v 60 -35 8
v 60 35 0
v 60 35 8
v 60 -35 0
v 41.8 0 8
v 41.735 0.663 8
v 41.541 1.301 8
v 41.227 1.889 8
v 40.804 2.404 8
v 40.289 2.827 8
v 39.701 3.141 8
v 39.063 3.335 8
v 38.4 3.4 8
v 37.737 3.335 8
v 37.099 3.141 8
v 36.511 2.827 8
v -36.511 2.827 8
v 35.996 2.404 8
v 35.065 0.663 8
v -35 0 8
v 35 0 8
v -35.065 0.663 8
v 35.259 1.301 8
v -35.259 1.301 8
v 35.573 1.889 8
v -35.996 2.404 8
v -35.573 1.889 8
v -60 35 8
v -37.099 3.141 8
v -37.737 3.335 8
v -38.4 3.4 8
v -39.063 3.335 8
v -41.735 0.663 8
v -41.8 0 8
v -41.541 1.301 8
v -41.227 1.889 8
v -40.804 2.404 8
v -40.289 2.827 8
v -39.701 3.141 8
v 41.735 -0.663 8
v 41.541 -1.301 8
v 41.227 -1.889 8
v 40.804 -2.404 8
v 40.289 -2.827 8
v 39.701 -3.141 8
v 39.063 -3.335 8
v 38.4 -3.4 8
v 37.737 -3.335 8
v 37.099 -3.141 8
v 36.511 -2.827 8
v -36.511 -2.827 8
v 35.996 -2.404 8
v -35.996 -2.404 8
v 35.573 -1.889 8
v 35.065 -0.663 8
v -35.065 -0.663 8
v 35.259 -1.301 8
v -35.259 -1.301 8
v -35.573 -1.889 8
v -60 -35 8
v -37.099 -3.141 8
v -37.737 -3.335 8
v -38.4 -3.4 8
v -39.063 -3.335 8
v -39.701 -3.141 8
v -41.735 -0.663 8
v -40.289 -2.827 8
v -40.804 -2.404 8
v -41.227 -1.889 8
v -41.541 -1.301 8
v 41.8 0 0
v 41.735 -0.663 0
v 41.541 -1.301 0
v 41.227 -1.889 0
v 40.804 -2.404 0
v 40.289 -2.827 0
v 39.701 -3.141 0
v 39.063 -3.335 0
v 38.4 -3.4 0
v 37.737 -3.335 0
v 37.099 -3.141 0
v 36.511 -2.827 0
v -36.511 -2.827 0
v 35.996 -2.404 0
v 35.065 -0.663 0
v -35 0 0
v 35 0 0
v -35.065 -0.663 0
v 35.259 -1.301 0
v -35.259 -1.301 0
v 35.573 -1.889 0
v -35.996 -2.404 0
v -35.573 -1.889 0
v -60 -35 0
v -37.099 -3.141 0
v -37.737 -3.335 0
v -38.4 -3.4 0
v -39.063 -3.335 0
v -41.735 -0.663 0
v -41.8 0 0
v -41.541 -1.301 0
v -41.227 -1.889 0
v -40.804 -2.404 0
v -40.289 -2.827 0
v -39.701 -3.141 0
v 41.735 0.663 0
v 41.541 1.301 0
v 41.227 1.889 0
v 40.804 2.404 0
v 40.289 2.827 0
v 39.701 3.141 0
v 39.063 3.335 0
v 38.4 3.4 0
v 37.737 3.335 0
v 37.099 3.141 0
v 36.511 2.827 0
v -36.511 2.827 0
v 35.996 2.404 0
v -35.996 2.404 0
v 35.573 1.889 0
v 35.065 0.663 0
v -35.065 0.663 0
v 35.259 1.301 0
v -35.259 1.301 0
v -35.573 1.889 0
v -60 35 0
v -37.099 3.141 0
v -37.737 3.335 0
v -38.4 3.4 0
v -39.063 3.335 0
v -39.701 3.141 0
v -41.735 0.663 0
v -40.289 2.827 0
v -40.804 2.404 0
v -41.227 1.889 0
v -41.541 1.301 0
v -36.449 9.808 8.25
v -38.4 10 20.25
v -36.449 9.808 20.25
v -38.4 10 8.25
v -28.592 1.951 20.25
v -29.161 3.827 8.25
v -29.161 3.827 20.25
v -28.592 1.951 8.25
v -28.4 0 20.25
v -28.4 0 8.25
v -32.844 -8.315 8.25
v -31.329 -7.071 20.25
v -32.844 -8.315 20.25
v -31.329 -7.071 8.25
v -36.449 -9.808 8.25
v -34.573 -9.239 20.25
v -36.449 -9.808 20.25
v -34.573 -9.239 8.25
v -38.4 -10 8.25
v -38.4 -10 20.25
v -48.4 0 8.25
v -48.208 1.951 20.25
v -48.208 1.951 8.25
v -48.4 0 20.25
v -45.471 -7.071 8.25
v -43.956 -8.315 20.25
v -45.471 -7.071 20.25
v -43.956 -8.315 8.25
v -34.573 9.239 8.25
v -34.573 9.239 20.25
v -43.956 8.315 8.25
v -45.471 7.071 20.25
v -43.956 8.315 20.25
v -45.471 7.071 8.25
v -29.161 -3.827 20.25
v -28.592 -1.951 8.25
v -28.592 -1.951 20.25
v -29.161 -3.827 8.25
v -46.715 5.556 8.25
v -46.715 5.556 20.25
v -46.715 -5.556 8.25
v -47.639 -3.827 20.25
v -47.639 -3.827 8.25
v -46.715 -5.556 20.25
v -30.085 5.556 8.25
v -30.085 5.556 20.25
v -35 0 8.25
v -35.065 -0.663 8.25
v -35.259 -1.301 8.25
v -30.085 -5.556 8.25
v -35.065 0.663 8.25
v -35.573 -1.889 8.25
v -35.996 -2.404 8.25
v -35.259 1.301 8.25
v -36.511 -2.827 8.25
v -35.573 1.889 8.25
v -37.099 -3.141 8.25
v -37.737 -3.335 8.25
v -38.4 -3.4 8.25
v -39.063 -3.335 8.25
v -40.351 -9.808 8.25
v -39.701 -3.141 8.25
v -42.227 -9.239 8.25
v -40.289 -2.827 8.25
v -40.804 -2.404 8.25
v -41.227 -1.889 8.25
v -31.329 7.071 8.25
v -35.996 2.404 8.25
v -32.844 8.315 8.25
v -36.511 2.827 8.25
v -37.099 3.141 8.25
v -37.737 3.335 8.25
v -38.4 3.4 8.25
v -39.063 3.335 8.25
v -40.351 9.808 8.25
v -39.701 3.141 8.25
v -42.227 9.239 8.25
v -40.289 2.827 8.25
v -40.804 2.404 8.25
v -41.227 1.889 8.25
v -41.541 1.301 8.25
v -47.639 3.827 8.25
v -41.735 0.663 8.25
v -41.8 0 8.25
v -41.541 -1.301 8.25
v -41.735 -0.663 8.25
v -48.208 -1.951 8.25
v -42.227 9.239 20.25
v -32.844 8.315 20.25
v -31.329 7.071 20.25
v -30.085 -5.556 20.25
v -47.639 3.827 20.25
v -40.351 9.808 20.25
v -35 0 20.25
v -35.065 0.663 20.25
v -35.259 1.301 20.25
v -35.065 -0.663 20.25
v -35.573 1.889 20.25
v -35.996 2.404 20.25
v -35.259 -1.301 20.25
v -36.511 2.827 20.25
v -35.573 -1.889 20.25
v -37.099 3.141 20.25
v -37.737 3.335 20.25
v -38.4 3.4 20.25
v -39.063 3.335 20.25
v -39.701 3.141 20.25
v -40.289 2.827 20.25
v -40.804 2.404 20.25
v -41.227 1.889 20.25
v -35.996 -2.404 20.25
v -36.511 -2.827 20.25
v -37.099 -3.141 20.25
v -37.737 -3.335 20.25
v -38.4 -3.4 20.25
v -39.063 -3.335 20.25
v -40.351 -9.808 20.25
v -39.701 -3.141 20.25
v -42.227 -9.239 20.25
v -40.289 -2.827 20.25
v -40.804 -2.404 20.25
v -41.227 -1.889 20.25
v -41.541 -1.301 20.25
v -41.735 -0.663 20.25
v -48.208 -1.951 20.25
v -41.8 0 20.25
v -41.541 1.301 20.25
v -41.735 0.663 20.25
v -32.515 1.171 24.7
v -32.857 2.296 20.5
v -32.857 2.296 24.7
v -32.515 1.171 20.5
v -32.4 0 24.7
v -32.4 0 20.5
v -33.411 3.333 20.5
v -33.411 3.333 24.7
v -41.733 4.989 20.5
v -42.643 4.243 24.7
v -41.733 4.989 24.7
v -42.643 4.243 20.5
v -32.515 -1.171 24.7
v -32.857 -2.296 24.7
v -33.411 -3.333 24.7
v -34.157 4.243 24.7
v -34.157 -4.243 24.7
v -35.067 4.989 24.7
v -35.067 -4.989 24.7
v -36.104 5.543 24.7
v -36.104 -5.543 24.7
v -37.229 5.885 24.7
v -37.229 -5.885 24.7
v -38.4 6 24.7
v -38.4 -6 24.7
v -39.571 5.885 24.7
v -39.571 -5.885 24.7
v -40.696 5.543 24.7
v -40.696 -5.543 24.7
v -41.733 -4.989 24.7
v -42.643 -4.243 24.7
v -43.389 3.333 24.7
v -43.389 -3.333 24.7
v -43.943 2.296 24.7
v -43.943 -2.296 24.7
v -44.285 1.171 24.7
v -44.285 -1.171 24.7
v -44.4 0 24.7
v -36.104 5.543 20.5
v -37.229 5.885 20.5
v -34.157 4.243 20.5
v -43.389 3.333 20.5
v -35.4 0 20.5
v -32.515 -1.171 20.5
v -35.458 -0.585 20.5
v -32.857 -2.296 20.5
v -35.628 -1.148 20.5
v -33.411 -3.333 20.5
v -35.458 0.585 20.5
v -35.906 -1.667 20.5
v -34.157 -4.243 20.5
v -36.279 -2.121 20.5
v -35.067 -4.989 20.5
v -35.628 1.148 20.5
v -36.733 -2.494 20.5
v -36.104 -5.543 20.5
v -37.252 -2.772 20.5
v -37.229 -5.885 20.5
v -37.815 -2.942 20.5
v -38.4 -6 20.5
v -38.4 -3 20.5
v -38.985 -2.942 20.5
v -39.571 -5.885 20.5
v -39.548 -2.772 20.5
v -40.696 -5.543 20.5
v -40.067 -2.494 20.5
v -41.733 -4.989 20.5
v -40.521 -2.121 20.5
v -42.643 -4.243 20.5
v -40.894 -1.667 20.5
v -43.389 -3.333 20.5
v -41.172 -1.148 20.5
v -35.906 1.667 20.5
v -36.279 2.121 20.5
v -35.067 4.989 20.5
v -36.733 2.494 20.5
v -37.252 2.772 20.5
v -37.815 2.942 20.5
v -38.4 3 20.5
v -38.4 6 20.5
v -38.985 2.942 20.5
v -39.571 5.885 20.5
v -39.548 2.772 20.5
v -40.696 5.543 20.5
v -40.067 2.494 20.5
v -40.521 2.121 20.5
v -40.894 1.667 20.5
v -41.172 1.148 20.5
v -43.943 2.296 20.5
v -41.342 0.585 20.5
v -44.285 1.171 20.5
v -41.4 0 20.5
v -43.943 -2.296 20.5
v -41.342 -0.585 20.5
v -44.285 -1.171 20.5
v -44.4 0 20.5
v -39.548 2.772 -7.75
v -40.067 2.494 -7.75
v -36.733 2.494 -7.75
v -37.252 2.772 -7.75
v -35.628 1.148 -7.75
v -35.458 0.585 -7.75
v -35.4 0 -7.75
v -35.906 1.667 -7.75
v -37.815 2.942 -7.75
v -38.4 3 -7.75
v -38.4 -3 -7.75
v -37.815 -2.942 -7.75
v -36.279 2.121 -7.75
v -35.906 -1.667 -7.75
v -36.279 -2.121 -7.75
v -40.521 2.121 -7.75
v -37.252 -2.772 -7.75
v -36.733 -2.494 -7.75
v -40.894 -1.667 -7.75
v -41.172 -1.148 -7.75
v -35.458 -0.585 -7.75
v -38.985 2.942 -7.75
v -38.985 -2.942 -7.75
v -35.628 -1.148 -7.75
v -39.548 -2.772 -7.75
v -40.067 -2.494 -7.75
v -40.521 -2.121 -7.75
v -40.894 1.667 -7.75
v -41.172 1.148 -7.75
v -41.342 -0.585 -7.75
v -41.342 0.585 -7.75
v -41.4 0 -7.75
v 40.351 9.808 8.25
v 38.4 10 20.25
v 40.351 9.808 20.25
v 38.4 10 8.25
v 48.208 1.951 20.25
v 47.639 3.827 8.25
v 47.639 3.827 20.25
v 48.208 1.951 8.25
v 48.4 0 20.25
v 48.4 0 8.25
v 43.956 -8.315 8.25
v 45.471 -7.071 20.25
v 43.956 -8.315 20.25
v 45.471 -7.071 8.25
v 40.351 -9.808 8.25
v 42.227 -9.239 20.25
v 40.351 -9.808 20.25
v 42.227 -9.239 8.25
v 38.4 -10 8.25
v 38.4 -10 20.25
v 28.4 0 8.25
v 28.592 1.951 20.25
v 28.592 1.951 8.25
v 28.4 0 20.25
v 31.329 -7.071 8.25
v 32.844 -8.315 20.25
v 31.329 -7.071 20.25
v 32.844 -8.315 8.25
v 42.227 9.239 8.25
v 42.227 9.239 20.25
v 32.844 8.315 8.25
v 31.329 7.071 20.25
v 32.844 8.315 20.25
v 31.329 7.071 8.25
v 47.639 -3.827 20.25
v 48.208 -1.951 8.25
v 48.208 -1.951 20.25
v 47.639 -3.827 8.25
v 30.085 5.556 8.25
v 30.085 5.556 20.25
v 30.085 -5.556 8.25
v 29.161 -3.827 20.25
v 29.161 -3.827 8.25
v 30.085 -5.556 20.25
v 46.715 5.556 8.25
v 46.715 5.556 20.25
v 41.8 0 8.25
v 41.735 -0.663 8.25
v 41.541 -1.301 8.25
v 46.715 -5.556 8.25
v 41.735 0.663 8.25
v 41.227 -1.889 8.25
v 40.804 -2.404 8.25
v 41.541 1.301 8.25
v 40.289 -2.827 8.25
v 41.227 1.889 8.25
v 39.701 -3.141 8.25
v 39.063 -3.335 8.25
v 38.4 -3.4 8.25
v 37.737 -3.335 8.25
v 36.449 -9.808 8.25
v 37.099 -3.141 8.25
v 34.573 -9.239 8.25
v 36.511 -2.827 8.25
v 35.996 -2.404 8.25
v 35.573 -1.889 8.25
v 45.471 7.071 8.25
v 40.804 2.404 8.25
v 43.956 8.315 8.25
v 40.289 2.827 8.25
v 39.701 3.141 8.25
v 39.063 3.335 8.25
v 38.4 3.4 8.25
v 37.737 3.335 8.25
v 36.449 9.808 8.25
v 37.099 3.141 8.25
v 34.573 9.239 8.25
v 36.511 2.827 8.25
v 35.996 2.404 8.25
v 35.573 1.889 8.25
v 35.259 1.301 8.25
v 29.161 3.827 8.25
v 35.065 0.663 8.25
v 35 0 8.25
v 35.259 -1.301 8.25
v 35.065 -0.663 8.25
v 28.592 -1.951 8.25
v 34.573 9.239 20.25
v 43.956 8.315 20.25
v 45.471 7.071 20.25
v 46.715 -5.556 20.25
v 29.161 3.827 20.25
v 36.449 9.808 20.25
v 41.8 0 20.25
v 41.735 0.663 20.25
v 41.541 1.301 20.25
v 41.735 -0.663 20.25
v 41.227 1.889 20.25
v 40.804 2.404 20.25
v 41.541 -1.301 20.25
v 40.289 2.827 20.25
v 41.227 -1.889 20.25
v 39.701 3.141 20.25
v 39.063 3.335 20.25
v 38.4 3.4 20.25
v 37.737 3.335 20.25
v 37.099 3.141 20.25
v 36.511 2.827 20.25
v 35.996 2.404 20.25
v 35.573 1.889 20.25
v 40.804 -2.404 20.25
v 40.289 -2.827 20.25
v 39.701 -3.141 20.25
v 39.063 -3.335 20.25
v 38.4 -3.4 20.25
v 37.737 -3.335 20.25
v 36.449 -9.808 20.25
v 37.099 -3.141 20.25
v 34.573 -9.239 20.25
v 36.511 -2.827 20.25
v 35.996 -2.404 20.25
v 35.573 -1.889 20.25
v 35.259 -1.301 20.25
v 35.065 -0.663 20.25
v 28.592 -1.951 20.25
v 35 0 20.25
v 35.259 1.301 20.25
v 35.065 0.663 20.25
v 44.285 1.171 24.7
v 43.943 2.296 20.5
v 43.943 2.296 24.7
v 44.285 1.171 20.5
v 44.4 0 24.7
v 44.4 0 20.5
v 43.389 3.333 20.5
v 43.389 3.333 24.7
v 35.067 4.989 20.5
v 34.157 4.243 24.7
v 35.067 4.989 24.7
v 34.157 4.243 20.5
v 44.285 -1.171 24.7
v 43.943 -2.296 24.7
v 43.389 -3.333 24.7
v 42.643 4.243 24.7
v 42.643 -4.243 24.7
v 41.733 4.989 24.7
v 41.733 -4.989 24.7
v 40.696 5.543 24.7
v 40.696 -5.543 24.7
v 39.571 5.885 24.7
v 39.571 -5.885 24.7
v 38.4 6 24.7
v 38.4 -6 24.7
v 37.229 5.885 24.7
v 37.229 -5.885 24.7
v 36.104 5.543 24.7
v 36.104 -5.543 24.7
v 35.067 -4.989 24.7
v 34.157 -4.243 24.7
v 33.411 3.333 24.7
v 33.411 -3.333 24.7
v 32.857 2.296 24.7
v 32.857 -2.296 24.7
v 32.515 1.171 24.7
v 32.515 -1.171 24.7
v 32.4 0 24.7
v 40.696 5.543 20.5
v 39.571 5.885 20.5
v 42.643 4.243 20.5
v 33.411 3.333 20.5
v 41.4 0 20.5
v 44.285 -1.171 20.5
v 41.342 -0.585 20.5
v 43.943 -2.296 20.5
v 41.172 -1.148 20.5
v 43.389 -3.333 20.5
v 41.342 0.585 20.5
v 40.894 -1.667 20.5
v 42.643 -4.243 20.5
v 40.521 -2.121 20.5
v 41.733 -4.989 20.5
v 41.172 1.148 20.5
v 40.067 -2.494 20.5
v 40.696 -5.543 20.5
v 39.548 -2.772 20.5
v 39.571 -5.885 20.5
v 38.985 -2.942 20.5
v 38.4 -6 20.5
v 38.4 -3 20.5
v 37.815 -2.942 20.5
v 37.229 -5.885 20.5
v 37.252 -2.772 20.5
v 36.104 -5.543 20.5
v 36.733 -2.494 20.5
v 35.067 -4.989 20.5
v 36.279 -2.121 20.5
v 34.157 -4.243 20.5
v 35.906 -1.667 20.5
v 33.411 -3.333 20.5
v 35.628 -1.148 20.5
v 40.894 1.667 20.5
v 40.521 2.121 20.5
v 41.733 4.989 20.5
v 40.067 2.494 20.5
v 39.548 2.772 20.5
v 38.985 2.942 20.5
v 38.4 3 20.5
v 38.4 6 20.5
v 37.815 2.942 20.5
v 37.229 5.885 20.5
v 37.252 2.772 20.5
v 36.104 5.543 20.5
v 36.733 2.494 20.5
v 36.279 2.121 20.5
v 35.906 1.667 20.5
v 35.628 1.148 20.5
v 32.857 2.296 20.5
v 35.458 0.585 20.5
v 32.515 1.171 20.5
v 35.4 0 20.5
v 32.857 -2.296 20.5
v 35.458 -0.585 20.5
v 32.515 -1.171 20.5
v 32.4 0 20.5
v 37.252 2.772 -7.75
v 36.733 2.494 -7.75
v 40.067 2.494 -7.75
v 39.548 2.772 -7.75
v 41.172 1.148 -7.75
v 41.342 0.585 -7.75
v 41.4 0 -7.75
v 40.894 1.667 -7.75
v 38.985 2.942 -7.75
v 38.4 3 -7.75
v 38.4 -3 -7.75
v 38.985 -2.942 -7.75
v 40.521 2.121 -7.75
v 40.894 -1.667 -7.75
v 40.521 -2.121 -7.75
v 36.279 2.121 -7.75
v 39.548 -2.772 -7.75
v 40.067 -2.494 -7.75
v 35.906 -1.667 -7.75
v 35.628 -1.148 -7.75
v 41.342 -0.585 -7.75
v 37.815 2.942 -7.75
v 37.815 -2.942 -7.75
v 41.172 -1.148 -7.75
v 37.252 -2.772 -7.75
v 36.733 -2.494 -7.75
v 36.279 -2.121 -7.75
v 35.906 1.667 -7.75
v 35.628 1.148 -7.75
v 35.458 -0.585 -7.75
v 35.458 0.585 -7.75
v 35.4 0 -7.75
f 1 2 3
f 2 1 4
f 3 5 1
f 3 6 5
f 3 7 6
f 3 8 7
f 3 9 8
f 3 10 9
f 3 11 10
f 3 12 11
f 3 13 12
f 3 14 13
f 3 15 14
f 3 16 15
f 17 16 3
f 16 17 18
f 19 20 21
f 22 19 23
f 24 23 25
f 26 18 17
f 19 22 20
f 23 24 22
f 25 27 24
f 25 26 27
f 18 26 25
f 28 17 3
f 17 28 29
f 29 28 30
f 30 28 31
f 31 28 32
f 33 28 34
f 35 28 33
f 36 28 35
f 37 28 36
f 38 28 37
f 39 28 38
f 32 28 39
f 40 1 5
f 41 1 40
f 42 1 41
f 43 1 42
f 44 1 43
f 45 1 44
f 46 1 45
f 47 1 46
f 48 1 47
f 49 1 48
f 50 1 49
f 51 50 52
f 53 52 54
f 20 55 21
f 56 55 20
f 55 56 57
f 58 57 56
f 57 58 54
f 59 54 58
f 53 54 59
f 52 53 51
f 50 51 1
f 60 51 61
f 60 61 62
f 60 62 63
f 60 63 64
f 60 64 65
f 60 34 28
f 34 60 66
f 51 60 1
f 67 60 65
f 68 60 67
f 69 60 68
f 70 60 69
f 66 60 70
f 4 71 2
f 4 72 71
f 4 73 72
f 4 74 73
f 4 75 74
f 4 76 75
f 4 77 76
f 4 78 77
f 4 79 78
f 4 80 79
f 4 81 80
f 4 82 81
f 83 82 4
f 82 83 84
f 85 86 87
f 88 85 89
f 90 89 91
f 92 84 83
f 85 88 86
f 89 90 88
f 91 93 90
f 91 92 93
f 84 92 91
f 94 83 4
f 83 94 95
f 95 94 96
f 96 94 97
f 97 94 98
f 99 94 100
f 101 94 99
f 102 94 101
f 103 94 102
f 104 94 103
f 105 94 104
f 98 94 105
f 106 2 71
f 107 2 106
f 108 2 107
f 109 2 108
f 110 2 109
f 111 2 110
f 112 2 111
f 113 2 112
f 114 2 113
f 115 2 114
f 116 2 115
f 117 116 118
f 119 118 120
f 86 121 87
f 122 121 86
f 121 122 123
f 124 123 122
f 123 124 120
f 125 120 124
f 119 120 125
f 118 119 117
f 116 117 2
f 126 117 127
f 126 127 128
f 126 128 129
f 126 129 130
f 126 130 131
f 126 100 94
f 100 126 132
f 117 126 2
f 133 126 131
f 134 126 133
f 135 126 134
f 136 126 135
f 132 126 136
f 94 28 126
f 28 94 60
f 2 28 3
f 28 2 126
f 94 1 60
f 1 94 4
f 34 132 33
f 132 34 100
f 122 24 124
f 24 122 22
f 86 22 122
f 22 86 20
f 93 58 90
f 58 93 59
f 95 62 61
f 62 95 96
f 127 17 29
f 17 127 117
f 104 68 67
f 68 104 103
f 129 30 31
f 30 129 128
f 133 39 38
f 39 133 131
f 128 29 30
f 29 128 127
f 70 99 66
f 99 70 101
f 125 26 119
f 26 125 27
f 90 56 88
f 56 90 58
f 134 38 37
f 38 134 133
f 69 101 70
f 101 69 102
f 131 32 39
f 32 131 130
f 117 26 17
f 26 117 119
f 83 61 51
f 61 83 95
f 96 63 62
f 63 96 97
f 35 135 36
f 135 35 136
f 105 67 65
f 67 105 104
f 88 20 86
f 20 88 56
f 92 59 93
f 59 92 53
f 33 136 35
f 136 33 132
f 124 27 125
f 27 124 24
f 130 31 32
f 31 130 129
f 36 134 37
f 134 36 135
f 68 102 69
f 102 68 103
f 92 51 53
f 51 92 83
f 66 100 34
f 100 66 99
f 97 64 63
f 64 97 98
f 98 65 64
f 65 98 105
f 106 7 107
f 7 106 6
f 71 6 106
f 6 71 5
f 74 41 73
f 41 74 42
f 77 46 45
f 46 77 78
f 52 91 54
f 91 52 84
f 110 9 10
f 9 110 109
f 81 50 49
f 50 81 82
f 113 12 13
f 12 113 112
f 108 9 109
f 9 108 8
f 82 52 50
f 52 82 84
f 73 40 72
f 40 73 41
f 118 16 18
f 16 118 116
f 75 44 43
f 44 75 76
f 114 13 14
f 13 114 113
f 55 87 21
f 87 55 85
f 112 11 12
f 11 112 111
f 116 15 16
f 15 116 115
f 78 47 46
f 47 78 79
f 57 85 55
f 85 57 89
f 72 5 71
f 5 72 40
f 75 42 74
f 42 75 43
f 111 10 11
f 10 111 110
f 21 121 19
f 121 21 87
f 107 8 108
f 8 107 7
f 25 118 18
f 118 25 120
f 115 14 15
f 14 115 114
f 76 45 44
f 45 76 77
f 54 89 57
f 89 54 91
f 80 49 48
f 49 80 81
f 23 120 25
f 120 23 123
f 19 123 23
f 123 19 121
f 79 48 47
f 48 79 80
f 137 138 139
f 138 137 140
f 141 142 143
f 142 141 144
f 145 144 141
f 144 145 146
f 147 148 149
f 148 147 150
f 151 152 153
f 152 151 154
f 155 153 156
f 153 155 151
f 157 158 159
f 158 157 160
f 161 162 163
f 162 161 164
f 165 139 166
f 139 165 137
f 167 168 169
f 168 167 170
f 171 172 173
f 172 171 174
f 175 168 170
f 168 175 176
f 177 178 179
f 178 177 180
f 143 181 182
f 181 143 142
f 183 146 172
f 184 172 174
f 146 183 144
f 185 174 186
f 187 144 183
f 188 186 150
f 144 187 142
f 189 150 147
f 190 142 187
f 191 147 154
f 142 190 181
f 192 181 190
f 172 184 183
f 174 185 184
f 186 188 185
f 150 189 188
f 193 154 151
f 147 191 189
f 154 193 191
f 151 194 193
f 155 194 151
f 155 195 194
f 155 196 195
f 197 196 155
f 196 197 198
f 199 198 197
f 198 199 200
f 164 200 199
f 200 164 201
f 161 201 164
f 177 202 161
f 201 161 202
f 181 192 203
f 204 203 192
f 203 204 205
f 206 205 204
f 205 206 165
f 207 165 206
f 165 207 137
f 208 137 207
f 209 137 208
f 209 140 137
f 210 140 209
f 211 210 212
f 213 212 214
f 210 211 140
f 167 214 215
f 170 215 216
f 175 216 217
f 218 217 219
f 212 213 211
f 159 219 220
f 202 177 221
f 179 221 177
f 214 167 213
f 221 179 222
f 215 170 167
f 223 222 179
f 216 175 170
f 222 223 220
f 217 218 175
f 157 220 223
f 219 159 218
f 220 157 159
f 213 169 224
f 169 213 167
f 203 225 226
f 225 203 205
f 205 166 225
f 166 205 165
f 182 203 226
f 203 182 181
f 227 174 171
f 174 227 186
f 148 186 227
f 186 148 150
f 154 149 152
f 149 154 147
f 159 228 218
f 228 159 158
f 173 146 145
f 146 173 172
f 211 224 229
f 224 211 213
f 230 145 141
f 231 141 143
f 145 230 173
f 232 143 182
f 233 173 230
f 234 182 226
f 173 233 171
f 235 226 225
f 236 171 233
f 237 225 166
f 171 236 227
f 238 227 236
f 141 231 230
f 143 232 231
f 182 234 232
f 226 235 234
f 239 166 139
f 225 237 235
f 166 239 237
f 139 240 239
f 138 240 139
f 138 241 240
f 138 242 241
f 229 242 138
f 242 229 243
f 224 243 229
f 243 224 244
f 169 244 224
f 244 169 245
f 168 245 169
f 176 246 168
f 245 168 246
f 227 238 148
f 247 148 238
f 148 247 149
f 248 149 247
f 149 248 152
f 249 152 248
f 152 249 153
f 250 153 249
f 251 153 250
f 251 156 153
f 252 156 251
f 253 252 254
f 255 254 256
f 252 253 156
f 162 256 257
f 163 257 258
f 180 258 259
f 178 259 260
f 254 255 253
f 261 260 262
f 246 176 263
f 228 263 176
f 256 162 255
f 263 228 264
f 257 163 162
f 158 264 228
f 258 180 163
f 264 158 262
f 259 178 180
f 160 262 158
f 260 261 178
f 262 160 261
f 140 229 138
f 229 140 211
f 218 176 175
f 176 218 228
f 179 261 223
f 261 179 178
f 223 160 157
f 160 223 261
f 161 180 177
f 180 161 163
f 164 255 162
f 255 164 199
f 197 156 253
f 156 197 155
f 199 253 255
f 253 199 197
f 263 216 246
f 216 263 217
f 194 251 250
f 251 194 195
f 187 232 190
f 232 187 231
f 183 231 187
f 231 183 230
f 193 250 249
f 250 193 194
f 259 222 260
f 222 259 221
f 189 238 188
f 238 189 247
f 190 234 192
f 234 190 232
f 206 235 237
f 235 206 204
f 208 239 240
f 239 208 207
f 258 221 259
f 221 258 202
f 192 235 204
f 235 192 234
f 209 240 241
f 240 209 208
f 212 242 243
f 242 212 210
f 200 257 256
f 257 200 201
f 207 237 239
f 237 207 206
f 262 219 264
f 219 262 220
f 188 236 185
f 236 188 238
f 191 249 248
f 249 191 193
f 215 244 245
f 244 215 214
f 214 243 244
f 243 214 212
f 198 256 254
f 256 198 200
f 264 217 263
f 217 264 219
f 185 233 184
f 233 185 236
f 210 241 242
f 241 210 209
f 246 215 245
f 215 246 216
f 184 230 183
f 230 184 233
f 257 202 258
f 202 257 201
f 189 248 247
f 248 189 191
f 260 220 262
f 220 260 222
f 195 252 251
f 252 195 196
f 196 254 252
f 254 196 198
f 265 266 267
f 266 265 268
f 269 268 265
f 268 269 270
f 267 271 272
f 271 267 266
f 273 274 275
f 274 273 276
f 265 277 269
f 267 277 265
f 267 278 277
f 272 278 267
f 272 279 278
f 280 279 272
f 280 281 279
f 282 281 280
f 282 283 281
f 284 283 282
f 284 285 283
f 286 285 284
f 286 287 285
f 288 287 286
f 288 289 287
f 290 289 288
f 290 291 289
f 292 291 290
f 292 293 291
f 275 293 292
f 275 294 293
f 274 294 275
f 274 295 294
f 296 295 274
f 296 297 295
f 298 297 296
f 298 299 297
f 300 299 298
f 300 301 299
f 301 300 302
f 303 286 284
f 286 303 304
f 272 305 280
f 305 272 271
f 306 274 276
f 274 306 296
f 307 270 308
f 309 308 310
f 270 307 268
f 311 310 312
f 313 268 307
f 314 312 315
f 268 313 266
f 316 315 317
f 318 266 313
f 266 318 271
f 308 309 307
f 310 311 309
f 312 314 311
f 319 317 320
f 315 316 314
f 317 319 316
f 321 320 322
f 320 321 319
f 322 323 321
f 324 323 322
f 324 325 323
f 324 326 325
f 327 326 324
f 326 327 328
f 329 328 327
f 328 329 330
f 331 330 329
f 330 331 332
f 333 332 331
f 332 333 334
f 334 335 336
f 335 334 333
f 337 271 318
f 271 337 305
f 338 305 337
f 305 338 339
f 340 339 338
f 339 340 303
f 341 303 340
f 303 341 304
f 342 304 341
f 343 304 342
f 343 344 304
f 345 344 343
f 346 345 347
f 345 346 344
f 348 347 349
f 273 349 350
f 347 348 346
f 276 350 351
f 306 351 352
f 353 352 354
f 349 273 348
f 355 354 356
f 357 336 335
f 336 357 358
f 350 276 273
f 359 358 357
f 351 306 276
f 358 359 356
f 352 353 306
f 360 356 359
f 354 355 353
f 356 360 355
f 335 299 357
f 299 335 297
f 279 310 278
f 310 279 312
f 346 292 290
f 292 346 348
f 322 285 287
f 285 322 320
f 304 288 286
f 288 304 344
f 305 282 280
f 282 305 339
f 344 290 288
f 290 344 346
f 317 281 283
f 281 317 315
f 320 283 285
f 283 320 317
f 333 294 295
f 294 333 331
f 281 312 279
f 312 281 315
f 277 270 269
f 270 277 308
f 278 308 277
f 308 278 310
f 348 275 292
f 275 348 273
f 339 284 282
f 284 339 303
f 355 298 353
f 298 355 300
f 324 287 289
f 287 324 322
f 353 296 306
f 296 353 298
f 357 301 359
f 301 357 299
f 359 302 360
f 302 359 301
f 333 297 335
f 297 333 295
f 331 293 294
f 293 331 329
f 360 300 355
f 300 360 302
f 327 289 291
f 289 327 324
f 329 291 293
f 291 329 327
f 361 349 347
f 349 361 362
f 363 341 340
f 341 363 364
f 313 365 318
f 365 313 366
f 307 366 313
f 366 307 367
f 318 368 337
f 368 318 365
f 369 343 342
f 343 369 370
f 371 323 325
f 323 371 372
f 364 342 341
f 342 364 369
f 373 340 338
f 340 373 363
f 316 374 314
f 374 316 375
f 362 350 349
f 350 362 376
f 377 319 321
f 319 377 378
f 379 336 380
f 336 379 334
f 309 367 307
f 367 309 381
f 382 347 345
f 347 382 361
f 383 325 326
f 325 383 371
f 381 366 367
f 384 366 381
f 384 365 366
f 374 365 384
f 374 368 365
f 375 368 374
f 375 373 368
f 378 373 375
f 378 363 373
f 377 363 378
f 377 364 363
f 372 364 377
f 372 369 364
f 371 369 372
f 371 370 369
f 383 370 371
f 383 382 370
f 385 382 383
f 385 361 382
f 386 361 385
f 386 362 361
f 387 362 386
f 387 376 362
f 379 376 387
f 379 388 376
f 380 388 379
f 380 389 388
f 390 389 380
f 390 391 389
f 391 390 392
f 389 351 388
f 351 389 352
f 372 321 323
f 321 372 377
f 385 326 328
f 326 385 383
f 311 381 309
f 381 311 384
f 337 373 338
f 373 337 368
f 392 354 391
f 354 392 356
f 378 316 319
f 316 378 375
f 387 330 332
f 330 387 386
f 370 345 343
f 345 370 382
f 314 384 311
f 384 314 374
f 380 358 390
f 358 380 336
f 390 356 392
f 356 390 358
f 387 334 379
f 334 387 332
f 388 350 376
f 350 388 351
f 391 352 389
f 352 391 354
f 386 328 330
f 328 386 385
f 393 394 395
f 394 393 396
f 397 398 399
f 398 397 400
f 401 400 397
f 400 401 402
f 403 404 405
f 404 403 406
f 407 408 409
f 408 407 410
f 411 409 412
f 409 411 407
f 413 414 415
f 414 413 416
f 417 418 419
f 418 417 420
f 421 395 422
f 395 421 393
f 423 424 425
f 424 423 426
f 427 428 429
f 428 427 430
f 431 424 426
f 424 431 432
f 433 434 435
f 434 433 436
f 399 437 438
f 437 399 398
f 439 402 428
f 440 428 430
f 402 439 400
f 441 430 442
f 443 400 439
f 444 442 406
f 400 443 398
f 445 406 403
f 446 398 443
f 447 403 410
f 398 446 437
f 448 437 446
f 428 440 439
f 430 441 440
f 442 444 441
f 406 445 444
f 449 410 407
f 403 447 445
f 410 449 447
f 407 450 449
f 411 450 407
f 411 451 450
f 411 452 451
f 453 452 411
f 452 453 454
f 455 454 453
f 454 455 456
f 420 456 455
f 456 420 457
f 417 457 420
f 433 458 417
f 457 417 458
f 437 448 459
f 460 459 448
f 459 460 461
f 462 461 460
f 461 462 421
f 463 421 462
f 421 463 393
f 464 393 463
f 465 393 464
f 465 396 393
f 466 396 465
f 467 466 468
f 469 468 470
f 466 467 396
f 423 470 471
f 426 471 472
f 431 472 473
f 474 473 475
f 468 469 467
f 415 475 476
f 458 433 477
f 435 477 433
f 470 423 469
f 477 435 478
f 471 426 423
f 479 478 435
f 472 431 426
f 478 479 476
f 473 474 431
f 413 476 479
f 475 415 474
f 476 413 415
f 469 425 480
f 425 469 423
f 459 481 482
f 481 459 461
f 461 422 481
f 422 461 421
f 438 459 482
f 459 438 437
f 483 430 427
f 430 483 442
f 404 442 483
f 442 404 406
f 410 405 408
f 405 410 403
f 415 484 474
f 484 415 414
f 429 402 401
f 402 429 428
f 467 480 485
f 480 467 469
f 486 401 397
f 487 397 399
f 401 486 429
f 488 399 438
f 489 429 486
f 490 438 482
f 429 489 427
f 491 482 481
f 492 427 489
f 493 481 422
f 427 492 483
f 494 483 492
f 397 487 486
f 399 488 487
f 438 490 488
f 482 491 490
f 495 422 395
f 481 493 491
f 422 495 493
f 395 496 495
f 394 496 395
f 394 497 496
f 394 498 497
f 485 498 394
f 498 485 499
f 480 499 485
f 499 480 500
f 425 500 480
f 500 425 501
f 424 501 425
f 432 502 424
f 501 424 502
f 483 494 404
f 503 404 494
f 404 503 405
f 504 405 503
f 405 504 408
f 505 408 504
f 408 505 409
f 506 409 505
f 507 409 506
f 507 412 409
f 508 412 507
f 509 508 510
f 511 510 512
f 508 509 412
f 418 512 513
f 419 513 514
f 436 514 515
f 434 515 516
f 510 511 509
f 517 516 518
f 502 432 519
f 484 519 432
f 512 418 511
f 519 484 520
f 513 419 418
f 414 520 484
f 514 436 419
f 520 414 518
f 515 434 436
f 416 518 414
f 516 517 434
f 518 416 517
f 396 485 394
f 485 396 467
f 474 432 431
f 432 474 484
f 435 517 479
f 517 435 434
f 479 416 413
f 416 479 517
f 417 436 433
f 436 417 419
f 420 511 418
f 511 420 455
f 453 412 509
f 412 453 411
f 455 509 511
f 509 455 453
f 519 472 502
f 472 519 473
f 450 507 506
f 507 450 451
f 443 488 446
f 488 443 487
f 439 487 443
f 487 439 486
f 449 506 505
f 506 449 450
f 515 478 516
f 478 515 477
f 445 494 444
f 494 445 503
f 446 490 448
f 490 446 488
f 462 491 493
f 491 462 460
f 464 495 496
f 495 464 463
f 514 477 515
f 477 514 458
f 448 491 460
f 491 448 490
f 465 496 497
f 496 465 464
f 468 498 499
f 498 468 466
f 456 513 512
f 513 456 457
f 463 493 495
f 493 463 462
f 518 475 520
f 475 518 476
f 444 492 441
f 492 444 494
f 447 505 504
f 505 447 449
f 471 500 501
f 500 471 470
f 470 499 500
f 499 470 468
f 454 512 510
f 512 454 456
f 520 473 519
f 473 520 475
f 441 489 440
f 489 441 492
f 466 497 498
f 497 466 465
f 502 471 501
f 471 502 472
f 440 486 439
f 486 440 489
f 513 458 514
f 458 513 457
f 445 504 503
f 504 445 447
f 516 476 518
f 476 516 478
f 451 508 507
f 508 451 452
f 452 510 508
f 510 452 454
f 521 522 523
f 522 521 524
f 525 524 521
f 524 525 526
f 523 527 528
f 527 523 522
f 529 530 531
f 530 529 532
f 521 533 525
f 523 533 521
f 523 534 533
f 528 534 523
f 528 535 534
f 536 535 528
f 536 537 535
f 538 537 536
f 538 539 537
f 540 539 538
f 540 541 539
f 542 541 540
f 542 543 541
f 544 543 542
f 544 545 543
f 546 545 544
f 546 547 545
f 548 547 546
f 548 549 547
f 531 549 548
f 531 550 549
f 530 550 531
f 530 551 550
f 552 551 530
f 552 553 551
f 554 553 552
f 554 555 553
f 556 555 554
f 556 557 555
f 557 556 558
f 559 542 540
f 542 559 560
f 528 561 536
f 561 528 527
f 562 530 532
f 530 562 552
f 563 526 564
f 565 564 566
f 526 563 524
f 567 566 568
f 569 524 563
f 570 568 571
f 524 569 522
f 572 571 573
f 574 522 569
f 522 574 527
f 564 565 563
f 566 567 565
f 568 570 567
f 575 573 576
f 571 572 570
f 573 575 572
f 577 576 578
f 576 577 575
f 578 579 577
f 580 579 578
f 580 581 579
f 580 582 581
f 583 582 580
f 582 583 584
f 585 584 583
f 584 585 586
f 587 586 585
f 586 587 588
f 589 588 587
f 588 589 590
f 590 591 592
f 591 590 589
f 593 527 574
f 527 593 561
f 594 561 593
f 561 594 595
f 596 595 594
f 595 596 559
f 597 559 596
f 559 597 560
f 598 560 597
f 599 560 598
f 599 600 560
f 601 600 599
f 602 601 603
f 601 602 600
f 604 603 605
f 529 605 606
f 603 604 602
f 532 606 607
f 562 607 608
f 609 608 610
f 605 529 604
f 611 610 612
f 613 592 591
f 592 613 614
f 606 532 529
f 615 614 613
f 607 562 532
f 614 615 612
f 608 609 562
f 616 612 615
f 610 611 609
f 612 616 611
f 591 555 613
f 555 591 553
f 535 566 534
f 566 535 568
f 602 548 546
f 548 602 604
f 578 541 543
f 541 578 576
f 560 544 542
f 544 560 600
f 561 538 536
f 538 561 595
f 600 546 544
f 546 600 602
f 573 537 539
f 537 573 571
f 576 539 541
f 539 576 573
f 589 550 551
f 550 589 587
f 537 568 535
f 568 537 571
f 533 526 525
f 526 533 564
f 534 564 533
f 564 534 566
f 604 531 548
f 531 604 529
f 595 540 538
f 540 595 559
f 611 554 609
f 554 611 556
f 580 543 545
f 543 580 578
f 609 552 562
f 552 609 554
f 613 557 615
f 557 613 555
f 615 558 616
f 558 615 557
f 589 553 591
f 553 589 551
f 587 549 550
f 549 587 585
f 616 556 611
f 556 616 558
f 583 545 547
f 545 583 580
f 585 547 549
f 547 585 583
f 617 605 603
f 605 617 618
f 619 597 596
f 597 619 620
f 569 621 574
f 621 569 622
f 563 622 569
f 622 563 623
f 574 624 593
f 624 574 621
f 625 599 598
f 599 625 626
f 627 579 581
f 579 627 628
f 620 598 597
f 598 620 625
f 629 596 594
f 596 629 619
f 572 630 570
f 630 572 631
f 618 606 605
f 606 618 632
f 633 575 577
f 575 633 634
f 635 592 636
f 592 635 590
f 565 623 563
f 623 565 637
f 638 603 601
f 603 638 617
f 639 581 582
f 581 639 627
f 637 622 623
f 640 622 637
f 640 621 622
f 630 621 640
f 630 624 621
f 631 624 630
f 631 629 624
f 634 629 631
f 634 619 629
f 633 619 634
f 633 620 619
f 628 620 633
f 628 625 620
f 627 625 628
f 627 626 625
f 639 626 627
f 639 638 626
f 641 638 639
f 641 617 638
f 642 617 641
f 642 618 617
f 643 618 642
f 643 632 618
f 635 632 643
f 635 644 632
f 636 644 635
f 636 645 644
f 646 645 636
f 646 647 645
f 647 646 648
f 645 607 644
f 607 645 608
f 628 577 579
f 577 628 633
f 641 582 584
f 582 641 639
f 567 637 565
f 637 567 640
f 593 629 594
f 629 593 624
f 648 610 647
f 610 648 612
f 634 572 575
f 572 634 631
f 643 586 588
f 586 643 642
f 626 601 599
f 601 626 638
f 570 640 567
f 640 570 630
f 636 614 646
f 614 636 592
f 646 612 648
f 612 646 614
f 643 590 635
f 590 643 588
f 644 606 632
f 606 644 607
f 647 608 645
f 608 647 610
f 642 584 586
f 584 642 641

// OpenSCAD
$fn = 32;

// ------------------------------------------------------------------------
// Standoff columns: 2 d20 standoffs, bolts d6
// Every part is its own module, assembly() places them once.
// ------------------------------------------------------------------------

// --- part 1 ---
module base_plate() {
  difference() {
    translate([-60, -35, 0]) cube([120, 70, 8]);
    translate([-38.4, 0, -1]) cylinder(h = 10, d = 6.8);
    translate([38.4, 0, -1]) cylinder(h = 10, d = 6.8);
  }
}

// --- part 2 ---
module spacer1() {
  difference() {
      translate([0, 0, 0]) cylinder(h = 12, d = 20);
      translate([0, 0, -1]) cylinder(h = 14, d = 6.8);
    }
}

// --- part 3 ---
module bolt1() {
  cylinder(h = 4.2, d = 12);
  translate([0, 0, -28.25]) cylinder(h = 28.25, d = 6);
}

// --- part 4 ---
module spacer2() {
  difference() {
      translate([0, 0, 0]) cylinder(h = 12, d = 20);
      translate([0, 0, -1]) cylinder(h = 14, d = 6.8);
    }
}

// --- part 5 ---
module bolt2() {
  cylinder(h = 4.2, d = 12);
  translate([0, 0, -28.25]) cylinder(h = 28.25, d = 6);
}

// --- assembly ---
module assembly() {
  translate([0, 0, 0]) rotate([0, 0, 0]) base_plate();
  translate([-38.4, 0, 8.25]) rotate([0, 0, 0]) spacer1();
  translate([-38.4, 0, 20.5]) rotate([0, 0, 0]) bolt1();
  translate([38.4, 0, 8.25]) rotate([0, 0, 0]) spacer2();
  translate([38.4, 0, 20.5]) rotate([0, 0, 0]) bolt2();
}

assembly();
